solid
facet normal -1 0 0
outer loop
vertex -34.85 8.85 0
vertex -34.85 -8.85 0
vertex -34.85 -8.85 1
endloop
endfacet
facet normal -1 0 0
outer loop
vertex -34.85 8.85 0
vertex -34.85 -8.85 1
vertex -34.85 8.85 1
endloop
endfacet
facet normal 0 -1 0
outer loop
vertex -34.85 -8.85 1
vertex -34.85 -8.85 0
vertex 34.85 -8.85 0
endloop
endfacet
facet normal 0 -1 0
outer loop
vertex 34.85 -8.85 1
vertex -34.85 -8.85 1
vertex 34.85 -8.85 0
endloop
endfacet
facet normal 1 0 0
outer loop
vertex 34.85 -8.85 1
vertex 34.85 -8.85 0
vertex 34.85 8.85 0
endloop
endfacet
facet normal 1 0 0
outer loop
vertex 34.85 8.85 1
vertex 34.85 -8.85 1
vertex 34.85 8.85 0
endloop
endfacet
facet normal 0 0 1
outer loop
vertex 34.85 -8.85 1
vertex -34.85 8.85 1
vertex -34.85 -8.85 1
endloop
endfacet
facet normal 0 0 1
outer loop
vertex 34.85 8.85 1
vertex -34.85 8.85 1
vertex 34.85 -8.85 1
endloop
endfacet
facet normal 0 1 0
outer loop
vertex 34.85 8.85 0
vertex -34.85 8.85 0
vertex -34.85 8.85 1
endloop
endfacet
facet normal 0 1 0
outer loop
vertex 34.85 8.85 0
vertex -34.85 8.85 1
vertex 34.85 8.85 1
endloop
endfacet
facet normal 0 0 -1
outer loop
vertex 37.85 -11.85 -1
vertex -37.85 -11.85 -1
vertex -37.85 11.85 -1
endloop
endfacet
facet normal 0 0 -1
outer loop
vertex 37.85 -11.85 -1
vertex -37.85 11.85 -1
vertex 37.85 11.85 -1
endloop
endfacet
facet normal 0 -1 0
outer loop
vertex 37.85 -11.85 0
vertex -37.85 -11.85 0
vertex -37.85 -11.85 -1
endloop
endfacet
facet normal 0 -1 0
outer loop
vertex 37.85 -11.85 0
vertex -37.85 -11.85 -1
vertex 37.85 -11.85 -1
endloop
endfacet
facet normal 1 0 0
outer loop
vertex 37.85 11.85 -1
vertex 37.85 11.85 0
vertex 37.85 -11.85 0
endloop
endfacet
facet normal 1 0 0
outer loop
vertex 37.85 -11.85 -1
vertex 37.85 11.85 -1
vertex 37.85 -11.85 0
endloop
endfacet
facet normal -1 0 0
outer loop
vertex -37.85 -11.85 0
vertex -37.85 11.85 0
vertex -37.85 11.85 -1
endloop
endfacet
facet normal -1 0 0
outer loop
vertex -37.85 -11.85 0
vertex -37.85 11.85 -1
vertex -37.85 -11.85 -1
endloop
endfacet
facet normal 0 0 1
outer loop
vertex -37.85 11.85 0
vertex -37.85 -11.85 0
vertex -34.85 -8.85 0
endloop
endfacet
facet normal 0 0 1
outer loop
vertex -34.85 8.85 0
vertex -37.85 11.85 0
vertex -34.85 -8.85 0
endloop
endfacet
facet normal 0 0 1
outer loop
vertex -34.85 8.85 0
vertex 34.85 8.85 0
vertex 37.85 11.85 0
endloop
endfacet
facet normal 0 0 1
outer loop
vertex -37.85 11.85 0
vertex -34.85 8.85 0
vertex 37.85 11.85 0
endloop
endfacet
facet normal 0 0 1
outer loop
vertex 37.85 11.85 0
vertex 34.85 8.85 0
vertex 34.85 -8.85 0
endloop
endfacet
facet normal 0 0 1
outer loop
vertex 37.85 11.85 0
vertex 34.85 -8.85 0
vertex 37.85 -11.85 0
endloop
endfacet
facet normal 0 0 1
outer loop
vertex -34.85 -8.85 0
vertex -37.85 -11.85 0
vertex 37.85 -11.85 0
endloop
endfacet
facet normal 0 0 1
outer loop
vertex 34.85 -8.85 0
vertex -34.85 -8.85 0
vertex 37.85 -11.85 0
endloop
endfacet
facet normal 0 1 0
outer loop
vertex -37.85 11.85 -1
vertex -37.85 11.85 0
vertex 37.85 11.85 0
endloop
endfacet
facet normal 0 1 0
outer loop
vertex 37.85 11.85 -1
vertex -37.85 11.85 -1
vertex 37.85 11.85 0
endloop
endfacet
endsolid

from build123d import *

# Parameters (mm, degrees)
F0_W     = 69.7
F0_H     = 17.7
F1_DEPTH = 1
F3_W     = 75.7
F3_H     = 23.7
F3_W_2   = 69.7
F3_H_2   = 17.7
F4_DEPTH = 1


with BuildPart() as f1:
    # F0 (on Top) → F1 (new body)
    with BuildSketch(Plane.XY):
        Rectangle(F0_W, F0_H)
    extrude(amount=F1_DEPTH)

    # F3 (on face) → F4 (join)
    with BuildSketch(Plane(origin=(0, 0, 0), x_dir=(1, 0, 0), z_dir=(0, 0, -1))):
        Rectangle(F3_W, F3_H)
        Rectangle(F3_W_2, F3_H_2, mode=Mode.SUBTRACT)
        Rectangle(F3_W_2, F3_H_2)
    extrude(amount=F4_DEPTH)


solid = f1.part
